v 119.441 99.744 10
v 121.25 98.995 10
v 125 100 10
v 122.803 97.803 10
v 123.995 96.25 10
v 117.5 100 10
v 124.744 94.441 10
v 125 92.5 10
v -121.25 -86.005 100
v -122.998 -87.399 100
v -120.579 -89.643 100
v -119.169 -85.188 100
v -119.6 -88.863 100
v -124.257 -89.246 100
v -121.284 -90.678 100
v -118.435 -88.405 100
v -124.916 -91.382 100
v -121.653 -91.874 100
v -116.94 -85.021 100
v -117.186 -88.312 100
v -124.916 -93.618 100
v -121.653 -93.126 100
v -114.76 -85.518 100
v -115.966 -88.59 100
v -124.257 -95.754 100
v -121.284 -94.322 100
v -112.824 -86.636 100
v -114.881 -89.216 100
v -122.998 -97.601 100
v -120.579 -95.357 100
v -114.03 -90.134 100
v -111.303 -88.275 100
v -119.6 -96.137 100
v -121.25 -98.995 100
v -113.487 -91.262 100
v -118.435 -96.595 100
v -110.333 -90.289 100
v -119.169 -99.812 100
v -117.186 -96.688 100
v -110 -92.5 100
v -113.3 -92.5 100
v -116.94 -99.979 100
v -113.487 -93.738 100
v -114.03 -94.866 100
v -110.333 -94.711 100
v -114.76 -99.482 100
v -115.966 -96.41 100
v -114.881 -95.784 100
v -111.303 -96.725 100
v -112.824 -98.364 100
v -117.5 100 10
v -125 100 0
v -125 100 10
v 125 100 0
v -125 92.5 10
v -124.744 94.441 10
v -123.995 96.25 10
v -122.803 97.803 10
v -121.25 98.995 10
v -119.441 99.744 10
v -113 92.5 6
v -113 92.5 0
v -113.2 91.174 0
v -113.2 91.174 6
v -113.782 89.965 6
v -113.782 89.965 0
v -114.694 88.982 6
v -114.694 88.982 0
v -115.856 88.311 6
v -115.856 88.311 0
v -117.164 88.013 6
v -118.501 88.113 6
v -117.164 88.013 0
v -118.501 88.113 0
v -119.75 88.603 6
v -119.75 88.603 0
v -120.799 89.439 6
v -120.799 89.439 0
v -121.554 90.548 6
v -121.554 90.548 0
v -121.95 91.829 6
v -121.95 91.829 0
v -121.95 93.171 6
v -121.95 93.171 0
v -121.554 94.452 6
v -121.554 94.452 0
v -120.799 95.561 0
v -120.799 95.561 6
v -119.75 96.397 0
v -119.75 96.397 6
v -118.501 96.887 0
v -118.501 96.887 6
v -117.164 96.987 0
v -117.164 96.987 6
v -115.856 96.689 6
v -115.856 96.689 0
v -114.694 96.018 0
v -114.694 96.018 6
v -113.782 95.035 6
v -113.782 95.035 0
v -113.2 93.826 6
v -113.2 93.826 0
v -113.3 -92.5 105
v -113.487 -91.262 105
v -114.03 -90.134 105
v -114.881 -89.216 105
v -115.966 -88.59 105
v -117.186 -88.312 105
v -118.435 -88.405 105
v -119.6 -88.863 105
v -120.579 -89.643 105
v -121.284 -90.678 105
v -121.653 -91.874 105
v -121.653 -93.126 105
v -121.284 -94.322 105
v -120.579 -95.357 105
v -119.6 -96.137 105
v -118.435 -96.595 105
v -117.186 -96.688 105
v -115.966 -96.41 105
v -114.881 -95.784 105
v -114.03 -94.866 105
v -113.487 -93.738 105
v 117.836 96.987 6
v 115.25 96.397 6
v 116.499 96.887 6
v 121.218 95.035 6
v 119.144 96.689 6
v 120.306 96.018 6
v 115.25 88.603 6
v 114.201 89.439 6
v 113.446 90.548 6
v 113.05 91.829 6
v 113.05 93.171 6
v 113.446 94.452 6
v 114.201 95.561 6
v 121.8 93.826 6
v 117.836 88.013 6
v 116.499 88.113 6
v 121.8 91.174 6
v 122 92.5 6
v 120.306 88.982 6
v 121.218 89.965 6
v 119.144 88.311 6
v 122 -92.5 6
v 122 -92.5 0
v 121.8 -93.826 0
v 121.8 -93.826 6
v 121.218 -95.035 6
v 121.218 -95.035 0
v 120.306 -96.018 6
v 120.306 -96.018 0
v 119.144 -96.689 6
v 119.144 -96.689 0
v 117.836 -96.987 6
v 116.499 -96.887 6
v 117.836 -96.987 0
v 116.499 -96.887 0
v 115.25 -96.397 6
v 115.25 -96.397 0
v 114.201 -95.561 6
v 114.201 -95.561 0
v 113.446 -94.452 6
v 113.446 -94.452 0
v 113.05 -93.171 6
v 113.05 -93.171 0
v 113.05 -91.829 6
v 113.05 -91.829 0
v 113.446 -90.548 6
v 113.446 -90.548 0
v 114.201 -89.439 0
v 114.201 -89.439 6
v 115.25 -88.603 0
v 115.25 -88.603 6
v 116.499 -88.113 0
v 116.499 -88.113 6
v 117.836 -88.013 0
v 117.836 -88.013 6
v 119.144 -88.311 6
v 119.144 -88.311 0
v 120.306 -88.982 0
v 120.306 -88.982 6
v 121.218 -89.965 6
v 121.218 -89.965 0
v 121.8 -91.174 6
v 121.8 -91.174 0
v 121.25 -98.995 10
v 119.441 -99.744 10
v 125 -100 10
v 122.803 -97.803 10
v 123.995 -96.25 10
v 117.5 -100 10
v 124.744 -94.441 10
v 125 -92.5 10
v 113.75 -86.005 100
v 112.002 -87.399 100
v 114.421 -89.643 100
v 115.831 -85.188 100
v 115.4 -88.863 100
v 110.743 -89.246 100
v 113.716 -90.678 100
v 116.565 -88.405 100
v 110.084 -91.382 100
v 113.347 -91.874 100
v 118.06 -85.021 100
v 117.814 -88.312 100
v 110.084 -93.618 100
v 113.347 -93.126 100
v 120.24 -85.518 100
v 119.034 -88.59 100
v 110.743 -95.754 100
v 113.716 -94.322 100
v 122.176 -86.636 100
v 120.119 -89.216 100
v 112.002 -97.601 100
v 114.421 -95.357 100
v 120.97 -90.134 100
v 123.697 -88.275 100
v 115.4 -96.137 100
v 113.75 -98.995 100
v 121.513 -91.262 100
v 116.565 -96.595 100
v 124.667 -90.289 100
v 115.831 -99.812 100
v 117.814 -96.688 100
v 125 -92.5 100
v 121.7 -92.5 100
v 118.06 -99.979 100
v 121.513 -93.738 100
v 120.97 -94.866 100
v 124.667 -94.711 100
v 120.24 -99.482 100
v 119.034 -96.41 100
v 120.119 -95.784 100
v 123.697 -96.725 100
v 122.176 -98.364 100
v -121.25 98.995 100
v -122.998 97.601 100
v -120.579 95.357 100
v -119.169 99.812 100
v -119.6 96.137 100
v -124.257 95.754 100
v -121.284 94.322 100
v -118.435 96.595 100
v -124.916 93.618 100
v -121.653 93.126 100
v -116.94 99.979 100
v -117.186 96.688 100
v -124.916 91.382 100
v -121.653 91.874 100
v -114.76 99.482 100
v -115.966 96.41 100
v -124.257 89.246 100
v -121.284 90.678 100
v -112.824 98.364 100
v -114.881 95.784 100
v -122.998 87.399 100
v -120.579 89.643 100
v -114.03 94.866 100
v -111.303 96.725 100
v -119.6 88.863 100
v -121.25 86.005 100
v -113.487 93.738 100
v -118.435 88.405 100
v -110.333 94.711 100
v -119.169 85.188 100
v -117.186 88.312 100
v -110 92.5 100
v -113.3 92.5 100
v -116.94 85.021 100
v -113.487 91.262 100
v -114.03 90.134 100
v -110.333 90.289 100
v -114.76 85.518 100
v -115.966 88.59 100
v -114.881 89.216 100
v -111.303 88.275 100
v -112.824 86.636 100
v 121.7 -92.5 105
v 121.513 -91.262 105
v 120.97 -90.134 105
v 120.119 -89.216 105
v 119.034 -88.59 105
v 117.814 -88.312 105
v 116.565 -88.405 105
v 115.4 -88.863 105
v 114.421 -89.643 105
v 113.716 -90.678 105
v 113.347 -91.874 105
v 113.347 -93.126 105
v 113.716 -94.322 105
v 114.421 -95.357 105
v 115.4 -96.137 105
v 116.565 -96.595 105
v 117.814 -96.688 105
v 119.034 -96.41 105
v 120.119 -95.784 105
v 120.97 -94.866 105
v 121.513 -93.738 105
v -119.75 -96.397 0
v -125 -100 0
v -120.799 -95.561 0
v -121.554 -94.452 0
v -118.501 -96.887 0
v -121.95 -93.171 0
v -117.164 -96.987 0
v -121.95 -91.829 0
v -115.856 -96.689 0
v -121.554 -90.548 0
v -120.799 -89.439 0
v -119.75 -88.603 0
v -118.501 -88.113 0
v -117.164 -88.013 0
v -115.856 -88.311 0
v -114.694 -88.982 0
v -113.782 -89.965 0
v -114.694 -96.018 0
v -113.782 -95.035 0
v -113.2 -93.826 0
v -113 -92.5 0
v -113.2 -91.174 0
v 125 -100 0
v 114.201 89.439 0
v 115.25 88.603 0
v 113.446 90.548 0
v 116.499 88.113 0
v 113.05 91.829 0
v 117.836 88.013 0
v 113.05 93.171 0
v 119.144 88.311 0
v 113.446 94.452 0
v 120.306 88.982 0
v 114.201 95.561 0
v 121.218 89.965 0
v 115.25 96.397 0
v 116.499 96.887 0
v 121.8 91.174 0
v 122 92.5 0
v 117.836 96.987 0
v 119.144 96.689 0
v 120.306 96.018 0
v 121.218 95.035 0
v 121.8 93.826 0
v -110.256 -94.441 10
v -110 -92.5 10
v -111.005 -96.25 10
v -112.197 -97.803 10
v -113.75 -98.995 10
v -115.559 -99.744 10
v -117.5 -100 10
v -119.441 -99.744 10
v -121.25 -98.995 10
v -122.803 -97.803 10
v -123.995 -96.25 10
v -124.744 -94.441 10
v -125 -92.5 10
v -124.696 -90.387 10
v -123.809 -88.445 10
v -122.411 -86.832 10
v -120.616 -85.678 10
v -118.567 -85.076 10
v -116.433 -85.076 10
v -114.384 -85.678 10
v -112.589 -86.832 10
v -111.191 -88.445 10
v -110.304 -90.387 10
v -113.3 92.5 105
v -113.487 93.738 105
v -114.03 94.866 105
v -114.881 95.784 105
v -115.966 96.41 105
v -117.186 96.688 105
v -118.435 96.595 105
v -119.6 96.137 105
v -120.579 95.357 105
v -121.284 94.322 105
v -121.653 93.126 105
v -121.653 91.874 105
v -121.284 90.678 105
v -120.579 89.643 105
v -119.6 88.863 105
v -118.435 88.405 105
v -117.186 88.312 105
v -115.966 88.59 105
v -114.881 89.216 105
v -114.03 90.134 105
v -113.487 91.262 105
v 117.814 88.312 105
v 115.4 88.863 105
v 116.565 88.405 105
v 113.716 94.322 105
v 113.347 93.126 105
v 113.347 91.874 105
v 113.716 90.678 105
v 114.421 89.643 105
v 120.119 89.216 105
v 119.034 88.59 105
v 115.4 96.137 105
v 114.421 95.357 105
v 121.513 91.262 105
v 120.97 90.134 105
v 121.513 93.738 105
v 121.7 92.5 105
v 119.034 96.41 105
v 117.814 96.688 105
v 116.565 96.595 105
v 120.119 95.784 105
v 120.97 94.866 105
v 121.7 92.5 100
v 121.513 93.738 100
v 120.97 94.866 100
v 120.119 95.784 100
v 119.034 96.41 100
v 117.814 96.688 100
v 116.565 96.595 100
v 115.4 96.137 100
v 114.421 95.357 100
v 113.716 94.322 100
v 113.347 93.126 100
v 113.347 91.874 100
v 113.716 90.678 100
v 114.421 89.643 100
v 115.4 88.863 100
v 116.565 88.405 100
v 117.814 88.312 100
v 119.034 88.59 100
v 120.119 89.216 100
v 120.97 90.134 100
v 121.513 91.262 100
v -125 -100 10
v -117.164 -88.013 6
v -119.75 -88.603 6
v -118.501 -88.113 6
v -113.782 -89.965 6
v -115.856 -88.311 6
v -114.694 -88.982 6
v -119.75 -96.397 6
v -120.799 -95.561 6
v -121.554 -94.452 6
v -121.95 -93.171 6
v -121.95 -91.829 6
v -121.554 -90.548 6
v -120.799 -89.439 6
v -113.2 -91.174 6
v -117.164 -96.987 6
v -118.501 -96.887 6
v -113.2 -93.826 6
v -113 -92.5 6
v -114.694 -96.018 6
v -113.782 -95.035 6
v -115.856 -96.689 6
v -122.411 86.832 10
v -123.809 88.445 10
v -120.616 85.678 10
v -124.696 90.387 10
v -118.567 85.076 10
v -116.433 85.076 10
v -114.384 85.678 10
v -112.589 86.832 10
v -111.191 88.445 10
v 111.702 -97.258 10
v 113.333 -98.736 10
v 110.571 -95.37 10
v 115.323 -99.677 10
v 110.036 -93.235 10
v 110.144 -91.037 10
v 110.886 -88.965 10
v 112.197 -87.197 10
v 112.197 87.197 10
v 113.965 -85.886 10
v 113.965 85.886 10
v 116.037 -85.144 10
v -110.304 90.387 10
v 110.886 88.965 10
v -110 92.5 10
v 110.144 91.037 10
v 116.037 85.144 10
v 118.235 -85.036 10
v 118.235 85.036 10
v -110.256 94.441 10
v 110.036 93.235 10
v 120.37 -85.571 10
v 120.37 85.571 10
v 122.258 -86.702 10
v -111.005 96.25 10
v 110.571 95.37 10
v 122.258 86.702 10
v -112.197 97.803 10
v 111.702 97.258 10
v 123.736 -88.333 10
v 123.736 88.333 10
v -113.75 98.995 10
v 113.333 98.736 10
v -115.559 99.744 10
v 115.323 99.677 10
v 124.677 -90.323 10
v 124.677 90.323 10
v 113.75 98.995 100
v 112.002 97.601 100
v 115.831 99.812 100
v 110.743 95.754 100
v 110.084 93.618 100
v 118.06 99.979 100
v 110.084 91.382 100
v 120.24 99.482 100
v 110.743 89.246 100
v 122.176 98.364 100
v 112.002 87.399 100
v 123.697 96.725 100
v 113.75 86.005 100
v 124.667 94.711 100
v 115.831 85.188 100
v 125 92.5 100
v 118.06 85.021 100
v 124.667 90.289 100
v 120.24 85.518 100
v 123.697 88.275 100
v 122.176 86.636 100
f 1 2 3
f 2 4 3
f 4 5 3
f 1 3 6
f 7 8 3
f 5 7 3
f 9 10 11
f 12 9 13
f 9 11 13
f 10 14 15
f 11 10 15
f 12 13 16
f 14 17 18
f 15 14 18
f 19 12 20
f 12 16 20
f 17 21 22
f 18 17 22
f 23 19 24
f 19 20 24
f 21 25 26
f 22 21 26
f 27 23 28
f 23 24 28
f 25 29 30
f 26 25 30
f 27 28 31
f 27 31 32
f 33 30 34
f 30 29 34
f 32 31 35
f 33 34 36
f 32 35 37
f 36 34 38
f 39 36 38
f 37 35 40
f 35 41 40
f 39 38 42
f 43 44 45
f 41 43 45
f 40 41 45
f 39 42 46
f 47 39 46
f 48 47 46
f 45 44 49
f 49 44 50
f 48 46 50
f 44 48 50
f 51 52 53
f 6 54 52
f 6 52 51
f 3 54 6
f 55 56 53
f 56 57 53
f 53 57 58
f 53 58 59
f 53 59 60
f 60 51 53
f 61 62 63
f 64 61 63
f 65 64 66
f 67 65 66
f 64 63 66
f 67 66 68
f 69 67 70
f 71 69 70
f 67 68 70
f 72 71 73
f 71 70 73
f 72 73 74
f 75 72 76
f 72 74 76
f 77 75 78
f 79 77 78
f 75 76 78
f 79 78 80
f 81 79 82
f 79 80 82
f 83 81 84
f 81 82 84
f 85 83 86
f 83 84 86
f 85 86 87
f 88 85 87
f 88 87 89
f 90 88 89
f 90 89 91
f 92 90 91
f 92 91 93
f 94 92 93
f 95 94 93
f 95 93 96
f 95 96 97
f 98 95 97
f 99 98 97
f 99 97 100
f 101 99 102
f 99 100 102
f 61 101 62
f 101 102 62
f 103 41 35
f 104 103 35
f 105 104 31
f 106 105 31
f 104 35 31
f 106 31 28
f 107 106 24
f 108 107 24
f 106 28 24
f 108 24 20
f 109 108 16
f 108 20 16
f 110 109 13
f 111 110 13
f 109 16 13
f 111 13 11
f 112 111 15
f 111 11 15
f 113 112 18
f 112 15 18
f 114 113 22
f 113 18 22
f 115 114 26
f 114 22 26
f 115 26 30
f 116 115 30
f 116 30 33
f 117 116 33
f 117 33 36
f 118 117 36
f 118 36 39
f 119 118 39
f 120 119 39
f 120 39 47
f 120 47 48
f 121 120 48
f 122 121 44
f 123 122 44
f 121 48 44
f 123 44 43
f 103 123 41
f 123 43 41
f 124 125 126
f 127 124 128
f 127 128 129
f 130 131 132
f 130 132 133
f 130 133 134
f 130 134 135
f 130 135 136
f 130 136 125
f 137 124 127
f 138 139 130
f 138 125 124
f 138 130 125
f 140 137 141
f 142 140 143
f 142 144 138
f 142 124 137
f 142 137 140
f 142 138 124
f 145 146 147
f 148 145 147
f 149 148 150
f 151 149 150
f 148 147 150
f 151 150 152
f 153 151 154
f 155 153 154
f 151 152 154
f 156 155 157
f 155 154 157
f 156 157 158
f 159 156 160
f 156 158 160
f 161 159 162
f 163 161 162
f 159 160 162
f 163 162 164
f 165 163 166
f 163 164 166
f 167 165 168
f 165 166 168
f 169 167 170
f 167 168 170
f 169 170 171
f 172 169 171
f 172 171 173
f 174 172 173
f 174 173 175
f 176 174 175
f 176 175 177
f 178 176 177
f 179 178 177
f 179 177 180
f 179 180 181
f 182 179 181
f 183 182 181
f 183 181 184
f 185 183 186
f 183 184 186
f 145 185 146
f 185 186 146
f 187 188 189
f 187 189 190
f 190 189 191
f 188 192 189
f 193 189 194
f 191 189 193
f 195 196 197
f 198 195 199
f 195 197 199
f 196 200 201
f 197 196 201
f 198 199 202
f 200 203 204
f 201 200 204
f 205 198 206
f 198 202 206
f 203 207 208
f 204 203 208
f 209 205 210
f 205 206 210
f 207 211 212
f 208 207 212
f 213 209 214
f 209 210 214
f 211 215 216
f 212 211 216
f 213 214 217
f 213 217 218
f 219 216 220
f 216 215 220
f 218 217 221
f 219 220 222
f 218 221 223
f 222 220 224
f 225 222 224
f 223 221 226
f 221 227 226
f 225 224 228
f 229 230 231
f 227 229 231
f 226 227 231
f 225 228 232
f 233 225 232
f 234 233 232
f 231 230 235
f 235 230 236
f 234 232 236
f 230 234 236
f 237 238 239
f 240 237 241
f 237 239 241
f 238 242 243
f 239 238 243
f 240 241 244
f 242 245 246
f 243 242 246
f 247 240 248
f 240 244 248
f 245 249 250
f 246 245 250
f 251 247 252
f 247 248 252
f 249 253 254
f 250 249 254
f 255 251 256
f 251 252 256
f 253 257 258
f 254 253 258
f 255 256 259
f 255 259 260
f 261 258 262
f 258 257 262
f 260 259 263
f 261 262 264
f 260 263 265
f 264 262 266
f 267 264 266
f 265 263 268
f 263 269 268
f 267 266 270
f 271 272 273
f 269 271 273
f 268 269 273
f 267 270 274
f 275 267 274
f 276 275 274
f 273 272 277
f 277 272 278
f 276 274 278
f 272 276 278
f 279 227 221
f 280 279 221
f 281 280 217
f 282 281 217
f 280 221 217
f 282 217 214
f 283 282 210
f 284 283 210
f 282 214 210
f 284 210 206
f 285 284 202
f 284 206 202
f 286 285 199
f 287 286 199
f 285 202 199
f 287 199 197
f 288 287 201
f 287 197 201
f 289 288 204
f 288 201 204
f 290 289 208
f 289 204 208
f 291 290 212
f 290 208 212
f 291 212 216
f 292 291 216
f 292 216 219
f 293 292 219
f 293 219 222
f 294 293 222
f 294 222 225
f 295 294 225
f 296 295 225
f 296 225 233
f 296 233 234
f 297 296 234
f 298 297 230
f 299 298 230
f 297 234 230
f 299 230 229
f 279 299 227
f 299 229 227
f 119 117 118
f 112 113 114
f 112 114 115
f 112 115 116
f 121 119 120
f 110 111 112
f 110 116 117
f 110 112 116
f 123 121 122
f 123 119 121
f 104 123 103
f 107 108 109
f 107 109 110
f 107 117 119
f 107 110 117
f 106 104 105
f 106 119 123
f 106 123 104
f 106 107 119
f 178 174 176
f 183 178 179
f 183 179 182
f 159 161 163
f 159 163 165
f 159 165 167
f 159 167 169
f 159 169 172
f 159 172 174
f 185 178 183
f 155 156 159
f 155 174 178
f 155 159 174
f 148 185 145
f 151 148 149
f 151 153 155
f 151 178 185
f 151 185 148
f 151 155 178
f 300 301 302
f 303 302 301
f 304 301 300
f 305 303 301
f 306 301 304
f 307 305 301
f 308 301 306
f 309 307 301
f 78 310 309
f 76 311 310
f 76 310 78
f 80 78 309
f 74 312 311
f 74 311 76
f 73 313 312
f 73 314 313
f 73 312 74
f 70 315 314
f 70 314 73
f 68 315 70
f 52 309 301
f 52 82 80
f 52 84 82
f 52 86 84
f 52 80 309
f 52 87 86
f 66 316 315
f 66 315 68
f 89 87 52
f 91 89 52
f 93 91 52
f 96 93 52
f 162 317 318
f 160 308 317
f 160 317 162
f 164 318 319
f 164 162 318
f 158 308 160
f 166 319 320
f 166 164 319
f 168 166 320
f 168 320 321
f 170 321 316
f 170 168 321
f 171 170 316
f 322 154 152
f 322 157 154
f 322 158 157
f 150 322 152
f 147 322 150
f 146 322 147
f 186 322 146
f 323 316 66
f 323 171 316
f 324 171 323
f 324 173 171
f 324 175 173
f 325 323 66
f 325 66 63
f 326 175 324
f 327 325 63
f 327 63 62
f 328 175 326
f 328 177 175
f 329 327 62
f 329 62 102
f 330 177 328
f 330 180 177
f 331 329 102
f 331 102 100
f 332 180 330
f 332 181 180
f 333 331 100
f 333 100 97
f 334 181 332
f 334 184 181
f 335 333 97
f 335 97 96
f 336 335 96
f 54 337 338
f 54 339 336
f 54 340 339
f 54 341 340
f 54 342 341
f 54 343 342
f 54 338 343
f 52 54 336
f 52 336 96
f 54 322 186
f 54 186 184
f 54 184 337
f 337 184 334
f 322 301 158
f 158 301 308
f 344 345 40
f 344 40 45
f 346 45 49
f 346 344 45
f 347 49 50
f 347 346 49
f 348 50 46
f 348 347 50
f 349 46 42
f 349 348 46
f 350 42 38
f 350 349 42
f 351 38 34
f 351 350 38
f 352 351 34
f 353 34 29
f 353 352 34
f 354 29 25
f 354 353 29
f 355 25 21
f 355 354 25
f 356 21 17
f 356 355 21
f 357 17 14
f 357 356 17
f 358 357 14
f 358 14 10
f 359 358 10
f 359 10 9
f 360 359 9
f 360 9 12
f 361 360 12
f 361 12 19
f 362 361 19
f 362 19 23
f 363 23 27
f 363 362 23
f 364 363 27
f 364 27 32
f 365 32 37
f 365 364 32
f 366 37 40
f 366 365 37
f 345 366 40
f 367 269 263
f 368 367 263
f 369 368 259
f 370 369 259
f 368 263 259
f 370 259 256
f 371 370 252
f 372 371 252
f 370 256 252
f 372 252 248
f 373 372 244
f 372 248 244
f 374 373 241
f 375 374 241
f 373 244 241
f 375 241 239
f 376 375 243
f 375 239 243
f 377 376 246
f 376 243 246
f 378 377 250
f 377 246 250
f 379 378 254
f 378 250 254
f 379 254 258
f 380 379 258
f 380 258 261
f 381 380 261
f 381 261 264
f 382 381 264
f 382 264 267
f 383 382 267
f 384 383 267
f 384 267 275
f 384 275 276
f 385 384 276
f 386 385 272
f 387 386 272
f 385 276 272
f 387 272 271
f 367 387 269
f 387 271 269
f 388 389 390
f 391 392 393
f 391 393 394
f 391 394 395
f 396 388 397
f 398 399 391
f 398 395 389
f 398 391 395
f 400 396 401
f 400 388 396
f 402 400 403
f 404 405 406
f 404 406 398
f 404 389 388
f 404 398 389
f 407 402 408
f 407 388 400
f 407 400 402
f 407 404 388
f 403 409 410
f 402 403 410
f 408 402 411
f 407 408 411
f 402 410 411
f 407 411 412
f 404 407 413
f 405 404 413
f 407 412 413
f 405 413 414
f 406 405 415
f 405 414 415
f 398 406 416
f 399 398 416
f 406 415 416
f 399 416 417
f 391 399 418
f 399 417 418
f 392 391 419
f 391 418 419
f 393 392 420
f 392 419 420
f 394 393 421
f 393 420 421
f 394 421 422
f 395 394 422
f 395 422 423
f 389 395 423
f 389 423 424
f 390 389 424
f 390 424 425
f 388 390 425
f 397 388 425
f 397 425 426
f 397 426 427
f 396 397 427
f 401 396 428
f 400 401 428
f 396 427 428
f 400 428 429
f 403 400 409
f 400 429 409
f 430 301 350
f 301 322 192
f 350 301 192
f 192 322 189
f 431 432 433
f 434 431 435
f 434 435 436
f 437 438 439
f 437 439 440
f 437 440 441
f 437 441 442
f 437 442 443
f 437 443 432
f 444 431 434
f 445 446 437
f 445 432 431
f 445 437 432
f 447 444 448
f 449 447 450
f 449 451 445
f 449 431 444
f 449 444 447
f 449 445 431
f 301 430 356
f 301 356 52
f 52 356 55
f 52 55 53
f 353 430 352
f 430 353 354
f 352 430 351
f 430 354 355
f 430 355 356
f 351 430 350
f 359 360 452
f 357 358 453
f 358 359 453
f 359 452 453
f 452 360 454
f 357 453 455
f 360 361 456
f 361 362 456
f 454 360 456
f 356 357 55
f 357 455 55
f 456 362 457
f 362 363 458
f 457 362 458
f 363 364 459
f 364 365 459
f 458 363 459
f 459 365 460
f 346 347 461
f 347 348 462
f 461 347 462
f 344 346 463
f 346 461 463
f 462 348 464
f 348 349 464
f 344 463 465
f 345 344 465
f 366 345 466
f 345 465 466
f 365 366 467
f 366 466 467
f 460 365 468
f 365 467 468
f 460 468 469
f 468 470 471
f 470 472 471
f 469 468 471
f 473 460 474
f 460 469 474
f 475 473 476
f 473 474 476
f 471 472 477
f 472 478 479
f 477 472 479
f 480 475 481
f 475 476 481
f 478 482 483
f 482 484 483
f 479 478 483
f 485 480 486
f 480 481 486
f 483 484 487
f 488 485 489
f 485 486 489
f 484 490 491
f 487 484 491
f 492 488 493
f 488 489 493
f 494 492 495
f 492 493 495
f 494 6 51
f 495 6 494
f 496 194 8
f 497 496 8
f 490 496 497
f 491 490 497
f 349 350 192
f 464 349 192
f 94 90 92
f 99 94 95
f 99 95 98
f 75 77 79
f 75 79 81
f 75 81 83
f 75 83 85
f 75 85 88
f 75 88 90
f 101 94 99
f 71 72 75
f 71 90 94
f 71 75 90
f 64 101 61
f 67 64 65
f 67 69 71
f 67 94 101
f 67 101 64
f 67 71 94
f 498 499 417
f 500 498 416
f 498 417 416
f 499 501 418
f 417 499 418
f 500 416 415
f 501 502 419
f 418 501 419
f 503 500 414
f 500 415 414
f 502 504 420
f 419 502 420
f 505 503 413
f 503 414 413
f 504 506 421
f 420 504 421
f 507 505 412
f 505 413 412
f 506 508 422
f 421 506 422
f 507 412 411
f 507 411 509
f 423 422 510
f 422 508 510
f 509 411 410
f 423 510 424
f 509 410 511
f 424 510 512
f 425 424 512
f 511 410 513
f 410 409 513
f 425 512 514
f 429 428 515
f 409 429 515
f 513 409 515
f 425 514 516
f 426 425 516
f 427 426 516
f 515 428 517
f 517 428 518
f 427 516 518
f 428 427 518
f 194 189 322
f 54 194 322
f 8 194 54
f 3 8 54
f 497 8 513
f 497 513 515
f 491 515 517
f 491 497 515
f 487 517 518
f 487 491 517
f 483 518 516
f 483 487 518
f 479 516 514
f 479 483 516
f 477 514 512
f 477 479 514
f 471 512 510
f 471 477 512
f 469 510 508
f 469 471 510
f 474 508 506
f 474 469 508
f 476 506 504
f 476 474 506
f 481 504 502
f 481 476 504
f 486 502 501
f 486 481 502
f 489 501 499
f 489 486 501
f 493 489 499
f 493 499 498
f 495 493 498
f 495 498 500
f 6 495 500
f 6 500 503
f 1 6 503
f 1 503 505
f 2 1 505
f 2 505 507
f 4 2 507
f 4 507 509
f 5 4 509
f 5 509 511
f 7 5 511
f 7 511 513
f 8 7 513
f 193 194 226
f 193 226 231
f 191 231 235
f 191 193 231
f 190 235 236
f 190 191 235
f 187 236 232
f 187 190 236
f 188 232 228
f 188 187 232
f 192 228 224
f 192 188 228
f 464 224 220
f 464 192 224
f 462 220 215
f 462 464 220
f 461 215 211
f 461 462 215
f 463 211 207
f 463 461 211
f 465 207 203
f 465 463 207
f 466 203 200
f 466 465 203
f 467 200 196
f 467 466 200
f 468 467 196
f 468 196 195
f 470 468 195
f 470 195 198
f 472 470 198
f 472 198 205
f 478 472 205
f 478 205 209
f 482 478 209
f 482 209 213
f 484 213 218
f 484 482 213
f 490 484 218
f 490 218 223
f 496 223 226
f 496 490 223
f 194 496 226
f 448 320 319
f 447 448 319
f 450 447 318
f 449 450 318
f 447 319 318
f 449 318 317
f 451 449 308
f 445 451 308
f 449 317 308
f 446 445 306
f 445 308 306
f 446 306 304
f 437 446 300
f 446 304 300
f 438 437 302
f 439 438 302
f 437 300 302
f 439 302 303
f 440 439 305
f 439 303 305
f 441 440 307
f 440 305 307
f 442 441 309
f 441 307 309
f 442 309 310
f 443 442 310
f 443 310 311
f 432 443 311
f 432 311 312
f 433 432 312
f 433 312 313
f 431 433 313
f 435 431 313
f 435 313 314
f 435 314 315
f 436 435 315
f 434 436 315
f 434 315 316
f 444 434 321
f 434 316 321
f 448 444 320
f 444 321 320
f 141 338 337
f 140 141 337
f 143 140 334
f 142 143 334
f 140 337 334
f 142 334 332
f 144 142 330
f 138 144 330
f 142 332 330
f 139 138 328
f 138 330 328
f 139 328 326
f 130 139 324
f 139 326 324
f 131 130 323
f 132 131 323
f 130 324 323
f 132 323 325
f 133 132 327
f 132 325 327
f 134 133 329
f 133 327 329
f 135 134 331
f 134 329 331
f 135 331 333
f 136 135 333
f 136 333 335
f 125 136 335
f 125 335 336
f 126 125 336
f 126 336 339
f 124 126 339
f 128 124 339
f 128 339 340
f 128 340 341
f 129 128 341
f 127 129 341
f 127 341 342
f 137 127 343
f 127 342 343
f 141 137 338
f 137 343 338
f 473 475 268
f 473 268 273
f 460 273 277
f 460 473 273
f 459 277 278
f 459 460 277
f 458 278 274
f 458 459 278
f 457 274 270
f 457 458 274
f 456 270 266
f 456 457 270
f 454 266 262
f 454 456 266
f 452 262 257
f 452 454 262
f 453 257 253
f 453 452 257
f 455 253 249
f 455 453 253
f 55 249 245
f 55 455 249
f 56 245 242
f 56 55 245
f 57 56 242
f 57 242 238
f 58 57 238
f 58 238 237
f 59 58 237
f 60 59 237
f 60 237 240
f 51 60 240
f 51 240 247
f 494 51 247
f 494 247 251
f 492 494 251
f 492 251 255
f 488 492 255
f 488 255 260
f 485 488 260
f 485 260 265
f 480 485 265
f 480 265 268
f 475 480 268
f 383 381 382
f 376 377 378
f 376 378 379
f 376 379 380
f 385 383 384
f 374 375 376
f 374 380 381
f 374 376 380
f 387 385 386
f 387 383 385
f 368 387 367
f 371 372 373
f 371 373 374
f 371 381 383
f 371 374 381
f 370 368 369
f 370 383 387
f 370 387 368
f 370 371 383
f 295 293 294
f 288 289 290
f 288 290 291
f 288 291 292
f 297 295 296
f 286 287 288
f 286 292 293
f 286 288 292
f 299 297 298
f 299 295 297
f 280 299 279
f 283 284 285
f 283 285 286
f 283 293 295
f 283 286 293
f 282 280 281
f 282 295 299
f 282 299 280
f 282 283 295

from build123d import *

# Parameters (mm, degrees)
F2_W     = 200
F2_H     = 10
F3_DEPTH = 125
F4_R     = 7.5
F5_DEPTH = 100
F6_R     = 4.5
F7_DEPTH = 6
F8_R     = 4.2
F9_DEPTH = 5


with BuildPart() as f3:
    # F2 (on Right) → F3 (new body, symmetric)
    with BuildSketch(Plane.YZ):
        with Locations((0, 5)):
            Rectangle(F2_W, F2_H)
    extrude(amount=F3_DEPTH, both=True)

    # F4 (on face) → F5 (join)
    with BuildSketch(Plane(origin=(0, 0, 0), x_dir=(1, 0, 0), z_dir=(0, 0, -1))):
        with Locations((-117.5, -92.5)):
            Circle(F4_R)
        with Locations((117.5, -92.5)):
            Circle(F4_R)
        with Locations((117.5, 92.5)):
            Circle(F4_R)
        with Locations((-117.5, 92.5)):
            Circle(F4_R)
    extrude(amount=-F5_DEPTH)

    # F6 (on face) → F7 (cut)
    with BuildSketch(Plane(origin=(0, 0, 0), x_dir=(1, 0, 0), z_dir=(0, 0, -1))):
        with Locations((-117.5, 92.5)):
            Circle(F6_R)
        with Locations((-117.5, -92.5)):
            Circle(F6_R)
        with Locations((117.5, 92.5)):
            Circle(F6_R)
        with Locations((117.5, -92.5)):
            Circle(F6_R)
    extrude(amount=-F7_DEPTH, mode=Mode.SUBTRACT)

    # F8 (on face) → F9 (join)
    with BuildSketch(Plane.XY.offset(100)):
        with Locations((-117.5, 92.5)):
            Circle(F8_R)
        with Locations((117.5, 92.5)):
            Circle(F8_R)
        with Locations((117.5, -92.5)):
            Circle(F8_R)
        with Locations((-117.5, -92.5)):
            Circle(F8_R)
    extrude(amount=F9_DEPTH)


solid = f3.part
